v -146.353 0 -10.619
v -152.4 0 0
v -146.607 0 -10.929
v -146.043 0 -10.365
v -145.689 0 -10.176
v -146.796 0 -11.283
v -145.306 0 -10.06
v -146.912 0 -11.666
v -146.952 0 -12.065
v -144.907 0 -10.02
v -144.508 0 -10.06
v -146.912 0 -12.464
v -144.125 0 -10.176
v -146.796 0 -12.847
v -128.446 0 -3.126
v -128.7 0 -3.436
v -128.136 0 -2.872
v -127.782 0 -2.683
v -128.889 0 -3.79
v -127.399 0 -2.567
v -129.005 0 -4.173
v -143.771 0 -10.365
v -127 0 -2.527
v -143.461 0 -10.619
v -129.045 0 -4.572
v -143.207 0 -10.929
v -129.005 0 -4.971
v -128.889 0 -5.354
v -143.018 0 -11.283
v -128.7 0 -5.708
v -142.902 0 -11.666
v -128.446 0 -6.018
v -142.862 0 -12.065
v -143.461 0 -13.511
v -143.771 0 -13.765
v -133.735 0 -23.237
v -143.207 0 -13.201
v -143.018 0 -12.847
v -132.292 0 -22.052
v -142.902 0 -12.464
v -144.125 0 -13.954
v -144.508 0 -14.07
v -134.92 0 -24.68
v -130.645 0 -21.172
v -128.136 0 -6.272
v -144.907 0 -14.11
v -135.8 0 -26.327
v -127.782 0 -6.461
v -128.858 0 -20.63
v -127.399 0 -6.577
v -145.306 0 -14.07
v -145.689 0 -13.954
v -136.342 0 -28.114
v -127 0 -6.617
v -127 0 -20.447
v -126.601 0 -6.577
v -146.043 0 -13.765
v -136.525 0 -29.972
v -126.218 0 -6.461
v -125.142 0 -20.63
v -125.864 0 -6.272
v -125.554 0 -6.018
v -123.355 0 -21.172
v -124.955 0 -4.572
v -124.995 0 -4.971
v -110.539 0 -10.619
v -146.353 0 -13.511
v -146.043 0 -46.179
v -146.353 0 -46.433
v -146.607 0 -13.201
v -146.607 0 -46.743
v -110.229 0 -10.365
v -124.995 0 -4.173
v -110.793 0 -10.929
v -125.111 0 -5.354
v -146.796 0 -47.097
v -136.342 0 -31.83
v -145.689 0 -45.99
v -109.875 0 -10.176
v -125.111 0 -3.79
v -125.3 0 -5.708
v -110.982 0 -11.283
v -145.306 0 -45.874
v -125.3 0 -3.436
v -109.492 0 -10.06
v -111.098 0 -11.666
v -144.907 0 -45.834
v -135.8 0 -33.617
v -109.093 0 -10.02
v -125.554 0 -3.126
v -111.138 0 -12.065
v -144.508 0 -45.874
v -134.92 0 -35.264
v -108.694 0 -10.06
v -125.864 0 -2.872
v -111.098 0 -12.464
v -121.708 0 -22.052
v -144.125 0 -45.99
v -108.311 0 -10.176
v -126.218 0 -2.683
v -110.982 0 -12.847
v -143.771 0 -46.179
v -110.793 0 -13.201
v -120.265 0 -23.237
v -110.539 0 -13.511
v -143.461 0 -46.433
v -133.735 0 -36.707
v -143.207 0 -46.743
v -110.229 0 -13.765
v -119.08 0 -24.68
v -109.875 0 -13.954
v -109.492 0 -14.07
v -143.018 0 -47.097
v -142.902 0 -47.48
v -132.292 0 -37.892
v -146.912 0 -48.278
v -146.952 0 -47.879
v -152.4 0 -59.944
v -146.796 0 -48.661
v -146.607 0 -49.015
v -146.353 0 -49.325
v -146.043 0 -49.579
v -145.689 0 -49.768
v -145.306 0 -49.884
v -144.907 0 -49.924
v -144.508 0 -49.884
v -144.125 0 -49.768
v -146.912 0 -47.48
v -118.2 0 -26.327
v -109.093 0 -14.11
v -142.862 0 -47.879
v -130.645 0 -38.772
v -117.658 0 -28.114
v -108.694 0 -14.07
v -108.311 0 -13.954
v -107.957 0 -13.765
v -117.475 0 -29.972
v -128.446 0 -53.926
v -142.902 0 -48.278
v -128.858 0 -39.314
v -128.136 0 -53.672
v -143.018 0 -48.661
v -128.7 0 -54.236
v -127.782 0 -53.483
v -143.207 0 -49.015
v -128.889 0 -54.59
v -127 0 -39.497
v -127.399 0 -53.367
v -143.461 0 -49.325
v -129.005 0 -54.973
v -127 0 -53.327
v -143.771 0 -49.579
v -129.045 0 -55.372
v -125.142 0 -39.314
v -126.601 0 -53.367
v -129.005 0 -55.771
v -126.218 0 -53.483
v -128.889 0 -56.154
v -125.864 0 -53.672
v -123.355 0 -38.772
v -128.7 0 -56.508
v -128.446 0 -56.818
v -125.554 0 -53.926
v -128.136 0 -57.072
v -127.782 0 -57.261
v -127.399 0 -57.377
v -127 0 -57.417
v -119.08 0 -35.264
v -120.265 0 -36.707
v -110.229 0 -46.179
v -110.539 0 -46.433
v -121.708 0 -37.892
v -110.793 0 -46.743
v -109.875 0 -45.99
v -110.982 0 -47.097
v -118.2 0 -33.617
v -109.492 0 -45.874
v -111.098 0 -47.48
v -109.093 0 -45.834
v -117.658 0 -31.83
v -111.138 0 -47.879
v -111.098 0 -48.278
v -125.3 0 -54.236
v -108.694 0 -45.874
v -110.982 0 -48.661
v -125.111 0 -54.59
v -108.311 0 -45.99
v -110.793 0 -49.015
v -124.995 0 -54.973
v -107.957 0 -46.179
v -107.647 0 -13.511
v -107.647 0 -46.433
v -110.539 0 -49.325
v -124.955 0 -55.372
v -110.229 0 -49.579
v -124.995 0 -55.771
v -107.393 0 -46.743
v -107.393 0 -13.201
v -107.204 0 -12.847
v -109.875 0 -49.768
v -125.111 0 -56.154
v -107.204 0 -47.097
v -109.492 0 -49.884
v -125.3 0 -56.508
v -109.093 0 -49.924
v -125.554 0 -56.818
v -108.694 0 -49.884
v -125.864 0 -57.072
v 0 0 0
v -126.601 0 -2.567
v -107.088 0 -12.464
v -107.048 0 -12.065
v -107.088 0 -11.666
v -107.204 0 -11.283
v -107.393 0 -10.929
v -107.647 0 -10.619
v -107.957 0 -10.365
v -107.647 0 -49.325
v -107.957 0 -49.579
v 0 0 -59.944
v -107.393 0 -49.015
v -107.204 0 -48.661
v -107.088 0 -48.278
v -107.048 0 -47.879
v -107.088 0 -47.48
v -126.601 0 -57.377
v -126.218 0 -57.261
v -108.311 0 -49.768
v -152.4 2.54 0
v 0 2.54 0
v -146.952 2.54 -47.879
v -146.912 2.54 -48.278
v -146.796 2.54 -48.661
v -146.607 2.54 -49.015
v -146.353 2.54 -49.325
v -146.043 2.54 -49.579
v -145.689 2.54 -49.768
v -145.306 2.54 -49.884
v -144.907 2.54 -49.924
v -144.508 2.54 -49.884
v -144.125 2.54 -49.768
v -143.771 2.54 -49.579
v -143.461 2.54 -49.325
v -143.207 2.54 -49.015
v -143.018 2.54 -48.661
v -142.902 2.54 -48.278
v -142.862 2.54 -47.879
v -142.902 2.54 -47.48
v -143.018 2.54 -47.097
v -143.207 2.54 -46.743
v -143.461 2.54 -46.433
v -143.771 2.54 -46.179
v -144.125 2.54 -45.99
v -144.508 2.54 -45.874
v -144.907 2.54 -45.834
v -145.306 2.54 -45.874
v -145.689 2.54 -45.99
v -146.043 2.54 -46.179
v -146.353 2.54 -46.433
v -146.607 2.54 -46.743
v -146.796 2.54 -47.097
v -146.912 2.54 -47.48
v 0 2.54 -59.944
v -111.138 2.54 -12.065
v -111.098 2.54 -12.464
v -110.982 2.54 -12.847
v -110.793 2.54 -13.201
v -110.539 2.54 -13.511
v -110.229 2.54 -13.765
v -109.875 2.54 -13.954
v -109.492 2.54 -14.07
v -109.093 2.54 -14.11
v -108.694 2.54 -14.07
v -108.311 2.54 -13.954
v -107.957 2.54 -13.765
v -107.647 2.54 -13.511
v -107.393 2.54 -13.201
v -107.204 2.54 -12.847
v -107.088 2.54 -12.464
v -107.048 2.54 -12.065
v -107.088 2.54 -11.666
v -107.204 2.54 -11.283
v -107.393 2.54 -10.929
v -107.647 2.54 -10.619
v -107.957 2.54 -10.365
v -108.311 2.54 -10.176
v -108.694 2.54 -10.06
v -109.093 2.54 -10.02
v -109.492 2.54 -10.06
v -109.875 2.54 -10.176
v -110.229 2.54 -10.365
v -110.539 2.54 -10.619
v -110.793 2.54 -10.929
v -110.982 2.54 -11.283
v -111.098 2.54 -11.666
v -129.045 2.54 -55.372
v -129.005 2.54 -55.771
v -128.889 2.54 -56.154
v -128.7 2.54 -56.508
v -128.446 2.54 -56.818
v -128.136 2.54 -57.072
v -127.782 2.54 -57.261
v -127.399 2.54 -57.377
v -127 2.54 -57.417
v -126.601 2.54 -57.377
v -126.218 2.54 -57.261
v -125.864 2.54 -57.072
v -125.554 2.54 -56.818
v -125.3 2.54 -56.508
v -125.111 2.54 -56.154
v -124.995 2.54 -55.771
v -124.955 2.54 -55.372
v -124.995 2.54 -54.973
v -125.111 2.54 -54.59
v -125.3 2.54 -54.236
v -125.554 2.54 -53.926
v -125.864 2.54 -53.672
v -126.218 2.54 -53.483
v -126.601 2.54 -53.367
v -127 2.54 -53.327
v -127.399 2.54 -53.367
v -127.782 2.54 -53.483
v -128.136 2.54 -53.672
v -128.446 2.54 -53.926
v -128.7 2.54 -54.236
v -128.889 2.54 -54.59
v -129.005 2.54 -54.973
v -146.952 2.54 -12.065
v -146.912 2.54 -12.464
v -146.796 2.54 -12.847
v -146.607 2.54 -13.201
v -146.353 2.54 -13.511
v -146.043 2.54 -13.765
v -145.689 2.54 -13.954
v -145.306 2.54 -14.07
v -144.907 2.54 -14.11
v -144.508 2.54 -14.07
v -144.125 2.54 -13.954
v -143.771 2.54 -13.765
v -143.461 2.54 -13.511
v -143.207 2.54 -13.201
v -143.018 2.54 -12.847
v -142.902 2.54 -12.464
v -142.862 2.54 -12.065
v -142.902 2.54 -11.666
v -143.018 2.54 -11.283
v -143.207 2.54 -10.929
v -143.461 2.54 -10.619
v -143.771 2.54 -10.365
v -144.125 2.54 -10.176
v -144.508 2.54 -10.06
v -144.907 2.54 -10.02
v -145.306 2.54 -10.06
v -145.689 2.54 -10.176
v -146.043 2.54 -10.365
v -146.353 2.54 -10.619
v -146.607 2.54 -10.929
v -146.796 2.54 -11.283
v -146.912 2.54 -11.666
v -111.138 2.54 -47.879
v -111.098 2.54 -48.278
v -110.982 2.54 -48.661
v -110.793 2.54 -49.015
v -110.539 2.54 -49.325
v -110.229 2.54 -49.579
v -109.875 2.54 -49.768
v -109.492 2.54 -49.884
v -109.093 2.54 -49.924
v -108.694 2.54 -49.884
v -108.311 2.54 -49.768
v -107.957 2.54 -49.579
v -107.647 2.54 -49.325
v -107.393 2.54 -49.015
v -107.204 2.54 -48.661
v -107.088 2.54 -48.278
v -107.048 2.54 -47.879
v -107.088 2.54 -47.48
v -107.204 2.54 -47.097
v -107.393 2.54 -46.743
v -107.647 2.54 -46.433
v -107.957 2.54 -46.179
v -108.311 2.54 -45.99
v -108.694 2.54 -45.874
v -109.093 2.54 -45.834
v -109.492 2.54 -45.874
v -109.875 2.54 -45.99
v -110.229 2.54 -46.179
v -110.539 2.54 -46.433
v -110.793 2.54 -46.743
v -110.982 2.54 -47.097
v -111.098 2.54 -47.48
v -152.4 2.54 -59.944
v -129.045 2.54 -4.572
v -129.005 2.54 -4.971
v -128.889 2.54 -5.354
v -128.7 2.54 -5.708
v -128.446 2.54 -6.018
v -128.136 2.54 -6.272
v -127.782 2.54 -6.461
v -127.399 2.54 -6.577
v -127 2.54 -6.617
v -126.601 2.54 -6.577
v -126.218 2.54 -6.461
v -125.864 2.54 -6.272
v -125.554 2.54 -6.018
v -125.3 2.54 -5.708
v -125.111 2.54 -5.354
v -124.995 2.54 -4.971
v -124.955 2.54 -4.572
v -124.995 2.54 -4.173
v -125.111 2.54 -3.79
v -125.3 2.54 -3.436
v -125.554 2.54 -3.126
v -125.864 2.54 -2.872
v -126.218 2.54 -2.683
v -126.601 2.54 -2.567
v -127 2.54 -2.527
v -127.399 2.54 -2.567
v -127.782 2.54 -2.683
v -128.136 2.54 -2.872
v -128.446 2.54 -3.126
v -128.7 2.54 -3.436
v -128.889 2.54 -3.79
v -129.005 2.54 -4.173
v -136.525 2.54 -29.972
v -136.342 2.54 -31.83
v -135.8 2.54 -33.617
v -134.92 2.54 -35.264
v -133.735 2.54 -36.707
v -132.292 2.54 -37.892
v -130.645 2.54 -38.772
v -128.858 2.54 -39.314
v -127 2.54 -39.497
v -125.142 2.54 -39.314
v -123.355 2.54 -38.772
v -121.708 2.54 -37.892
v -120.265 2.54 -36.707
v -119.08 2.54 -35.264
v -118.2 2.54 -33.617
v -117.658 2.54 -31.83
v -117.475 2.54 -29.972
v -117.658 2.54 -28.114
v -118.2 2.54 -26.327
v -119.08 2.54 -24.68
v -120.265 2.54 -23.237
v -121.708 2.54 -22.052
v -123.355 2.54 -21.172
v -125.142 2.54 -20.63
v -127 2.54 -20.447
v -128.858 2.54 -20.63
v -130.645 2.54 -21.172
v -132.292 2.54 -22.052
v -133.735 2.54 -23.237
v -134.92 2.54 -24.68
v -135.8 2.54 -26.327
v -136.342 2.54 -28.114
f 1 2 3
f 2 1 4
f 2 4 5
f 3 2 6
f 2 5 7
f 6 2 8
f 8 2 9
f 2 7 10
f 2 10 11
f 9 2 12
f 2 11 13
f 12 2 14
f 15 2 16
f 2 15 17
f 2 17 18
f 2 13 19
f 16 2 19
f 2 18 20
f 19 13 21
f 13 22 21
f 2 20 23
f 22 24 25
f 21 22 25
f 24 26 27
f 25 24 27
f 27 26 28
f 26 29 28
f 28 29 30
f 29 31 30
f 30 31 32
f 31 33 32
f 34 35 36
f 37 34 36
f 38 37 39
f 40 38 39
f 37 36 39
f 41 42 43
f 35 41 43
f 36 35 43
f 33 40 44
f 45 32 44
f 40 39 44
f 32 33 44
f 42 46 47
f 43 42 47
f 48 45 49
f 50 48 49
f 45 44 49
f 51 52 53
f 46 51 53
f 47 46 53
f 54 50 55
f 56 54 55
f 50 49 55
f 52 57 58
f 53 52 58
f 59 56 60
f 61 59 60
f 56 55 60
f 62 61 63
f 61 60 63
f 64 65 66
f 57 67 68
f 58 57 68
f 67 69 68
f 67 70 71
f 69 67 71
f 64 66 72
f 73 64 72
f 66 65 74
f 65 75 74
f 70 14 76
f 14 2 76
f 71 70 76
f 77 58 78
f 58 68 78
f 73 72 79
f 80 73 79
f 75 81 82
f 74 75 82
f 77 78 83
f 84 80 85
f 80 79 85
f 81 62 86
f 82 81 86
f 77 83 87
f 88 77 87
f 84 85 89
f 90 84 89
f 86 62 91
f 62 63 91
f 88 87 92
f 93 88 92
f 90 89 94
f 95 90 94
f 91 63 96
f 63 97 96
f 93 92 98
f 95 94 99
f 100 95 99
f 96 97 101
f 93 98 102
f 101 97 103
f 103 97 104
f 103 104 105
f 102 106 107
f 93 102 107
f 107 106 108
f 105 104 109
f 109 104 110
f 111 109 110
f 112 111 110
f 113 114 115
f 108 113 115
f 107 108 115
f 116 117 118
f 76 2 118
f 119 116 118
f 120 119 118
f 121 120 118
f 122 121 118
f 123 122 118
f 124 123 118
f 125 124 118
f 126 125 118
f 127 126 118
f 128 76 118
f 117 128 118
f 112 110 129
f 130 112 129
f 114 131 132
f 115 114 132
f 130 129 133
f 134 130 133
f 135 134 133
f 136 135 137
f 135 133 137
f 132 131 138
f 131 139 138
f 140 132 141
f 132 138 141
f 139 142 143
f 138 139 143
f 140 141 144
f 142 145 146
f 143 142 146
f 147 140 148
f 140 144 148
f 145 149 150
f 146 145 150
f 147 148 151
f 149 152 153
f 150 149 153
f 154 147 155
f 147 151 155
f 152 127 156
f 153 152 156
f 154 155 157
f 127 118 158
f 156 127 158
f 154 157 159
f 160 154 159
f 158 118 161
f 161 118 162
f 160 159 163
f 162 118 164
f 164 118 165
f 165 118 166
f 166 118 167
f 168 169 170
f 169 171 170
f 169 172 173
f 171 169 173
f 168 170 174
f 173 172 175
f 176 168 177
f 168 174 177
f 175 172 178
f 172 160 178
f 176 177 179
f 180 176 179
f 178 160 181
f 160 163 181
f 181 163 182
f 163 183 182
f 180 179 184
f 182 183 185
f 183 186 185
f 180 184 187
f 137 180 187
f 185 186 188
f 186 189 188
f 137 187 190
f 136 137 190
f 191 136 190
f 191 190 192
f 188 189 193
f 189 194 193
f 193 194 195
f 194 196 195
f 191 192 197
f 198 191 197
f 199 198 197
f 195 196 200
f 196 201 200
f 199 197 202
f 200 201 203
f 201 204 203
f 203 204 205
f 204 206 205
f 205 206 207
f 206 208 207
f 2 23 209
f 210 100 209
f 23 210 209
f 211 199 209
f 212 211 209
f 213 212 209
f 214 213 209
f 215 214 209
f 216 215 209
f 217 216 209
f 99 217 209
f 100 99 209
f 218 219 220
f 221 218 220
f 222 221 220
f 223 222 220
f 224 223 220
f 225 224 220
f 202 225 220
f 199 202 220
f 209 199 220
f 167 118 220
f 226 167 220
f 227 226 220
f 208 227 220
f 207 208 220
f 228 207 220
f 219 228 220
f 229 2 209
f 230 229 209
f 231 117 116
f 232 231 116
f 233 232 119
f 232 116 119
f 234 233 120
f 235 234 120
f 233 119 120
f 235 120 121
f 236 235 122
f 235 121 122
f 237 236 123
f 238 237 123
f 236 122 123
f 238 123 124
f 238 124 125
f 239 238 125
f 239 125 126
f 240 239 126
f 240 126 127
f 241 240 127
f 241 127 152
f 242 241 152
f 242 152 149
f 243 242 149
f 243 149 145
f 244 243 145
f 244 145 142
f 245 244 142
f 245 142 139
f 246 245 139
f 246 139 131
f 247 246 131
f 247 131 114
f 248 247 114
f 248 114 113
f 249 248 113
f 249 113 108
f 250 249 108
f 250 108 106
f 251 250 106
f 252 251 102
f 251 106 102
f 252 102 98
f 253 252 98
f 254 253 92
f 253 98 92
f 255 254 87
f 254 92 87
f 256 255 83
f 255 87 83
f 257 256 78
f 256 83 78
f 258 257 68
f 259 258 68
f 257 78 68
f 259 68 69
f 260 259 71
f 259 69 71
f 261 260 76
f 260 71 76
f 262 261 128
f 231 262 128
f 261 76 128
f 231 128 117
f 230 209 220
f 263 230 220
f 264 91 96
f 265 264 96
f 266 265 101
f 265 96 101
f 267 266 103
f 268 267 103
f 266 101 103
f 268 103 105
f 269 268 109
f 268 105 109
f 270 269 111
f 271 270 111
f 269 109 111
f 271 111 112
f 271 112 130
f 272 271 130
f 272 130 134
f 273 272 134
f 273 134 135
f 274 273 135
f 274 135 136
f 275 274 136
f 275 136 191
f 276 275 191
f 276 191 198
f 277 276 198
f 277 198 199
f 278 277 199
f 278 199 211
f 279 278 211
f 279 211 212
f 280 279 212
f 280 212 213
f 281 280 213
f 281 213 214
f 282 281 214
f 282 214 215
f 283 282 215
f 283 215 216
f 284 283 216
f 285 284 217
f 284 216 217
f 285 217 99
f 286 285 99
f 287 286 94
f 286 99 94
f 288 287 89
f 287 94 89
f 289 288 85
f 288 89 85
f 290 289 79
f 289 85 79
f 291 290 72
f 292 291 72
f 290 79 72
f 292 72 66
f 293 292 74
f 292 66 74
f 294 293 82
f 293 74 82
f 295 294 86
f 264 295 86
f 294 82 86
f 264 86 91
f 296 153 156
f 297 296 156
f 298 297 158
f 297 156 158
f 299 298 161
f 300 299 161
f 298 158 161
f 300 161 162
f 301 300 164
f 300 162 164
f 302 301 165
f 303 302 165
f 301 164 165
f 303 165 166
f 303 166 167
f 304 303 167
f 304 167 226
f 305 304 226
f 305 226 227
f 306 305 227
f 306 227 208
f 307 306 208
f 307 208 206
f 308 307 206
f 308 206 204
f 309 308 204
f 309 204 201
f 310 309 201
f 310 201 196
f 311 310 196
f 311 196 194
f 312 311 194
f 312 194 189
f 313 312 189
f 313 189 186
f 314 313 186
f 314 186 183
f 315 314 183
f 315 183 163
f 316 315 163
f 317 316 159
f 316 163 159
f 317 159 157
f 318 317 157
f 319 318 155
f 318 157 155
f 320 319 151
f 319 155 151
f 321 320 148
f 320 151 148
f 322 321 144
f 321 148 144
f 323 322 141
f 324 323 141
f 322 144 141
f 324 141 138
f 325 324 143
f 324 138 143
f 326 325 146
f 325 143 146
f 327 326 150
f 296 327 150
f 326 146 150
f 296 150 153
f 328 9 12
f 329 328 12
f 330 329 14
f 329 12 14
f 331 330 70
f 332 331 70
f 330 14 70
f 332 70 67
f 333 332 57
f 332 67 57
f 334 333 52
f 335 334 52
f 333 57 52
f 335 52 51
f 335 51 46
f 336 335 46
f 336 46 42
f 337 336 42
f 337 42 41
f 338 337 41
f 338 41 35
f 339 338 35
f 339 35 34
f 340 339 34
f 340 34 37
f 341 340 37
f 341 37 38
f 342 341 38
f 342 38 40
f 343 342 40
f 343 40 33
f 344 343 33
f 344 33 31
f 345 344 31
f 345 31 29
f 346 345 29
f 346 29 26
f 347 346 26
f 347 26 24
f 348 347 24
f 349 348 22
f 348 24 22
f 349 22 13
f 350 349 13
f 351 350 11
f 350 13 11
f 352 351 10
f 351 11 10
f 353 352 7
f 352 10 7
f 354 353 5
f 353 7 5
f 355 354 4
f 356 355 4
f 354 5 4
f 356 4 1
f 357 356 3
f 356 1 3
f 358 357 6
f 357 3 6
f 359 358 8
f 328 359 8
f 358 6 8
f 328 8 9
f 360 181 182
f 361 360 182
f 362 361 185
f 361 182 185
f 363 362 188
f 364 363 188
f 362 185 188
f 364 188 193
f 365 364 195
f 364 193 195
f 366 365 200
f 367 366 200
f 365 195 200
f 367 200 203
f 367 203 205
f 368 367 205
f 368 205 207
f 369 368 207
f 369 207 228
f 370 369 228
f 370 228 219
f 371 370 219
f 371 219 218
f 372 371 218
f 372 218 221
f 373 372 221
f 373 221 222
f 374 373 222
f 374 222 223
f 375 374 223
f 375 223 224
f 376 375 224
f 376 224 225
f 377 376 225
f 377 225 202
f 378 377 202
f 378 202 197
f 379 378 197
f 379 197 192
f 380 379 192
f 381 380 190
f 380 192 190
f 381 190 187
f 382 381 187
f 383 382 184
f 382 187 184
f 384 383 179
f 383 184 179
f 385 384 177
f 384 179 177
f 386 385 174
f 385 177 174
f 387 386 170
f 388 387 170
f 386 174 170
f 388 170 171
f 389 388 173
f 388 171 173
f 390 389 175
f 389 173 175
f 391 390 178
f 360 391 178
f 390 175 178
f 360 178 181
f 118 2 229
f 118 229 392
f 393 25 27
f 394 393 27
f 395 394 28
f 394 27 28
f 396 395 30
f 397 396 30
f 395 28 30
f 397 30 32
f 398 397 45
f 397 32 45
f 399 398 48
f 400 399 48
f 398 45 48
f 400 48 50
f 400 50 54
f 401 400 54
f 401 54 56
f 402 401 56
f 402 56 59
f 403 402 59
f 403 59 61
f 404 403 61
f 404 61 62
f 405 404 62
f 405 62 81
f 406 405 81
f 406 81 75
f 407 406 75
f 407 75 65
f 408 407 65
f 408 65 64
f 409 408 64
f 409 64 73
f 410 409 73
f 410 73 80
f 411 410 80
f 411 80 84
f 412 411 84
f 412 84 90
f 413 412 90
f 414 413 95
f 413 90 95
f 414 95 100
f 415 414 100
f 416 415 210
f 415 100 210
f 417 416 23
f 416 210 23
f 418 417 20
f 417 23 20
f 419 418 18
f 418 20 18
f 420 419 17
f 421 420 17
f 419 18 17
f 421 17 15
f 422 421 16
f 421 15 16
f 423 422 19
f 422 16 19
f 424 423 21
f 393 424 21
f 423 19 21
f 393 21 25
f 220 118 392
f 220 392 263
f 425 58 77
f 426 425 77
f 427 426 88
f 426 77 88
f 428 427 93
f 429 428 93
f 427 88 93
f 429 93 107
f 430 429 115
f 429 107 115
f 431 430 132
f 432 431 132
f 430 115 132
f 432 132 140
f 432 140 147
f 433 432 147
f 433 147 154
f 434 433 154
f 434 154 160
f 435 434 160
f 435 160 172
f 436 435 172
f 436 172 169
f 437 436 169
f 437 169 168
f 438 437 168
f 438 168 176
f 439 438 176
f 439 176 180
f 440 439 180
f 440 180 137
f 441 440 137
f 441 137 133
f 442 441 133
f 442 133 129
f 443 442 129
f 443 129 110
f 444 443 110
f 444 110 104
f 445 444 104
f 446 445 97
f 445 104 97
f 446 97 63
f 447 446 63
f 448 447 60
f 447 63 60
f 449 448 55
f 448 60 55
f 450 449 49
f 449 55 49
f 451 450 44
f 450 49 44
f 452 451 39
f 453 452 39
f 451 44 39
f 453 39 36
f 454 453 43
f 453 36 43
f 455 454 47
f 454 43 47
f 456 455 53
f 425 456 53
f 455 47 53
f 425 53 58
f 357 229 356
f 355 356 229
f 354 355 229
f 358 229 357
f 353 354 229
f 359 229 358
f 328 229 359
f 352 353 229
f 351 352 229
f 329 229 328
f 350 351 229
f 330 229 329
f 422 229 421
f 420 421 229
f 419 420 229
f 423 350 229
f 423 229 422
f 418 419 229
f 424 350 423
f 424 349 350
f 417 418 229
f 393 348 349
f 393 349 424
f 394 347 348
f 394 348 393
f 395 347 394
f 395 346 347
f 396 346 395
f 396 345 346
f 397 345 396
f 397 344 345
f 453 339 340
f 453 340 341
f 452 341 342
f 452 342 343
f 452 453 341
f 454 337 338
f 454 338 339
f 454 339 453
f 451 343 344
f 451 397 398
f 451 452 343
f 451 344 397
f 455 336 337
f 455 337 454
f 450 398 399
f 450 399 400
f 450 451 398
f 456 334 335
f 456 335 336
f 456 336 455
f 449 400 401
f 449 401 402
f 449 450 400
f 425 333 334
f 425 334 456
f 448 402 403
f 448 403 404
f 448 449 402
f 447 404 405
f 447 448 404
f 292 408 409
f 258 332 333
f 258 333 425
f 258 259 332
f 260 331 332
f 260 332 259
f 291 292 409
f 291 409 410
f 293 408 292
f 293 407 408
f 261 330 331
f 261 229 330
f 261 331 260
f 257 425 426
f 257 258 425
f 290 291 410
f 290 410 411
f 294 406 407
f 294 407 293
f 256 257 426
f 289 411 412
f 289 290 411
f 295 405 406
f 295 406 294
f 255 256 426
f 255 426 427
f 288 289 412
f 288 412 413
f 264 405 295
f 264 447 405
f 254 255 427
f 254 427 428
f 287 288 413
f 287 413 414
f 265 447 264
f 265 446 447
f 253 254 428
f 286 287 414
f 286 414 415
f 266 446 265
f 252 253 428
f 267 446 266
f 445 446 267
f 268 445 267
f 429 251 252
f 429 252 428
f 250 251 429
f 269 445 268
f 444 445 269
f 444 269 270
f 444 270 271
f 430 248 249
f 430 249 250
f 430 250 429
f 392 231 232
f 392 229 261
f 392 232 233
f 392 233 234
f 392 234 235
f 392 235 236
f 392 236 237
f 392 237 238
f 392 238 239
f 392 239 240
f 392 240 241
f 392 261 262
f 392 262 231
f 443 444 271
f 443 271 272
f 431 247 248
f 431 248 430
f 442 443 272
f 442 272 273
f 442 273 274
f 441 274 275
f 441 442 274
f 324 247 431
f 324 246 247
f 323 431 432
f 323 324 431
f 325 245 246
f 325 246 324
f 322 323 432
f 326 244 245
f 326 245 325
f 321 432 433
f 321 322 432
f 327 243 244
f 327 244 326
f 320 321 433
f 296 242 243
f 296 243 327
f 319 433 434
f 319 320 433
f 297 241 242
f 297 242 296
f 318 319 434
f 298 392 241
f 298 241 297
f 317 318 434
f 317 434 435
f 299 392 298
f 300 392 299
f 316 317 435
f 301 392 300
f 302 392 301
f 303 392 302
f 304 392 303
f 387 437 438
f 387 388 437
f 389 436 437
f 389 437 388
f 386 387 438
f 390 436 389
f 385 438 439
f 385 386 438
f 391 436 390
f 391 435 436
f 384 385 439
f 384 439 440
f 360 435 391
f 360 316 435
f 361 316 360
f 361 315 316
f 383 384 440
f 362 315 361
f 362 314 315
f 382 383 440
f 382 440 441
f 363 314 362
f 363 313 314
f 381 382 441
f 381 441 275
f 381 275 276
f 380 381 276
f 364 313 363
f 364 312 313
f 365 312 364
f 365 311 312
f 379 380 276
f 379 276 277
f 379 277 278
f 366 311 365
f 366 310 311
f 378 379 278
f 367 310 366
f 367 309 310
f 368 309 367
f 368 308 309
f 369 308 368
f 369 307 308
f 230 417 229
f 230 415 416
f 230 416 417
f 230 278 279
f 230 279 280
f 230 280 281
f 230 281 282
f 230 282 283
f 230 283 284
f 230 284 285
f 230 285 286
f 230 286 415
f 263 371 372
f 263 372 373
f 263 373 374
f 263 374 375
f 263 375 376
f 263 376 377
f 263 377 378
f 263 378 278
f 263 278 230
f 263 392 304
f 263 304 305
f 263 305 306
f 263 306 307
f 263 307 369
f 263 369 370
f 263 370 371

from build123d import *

# Parameters (mm, degrees)
SKETCH1_W                   = 152.4
SKETCH1_H                   = 59.944
BOSS_EXTRUDE1_DEPTH         = 2.54
F_97_0_161_DIAMETER_HOLE1_D = 4.0894
F_97_0_75_DIAMETER_HOLE1_D  = 19.05


with BuildPart() as part:
    # Sketch1 → Boss-Extrude1 (new body)
    with BuildSketch(Plane(origin=(0, 0, 0), x_dir=(1, 0, 0), z_dir=(0, 1, 0))):
        with Locations((-76.2, 29.972)):
            Rectangle(SKETCH1_W, SKETCH1_H)
    extrude(amount=BOSS_EXTRUDE1_DEPTH)

    # #97 (0.161) Diameter Hole1 (through all)
    with Locations(Plane(origin=(0, 2.54, 0), x_dir=(1, 0, 0), z_dir=(0, 1, 0))):
        with Locations((-144.907, 47.879), (-127, 55.372), (-109.093, 47.879), (-109.093, 12.065), (-127, 4.572), (-144.907, 12.065)):
            Hole(F_97_0_161_DIAMETER_HOLE1_D / 2)

    # #97 (0.75) Diameter Hole1 (through all)
    with Locations(Plane(origin=(0, 2.54, 0), x_dir=(1, 0, 0), z_dir=(0, 1, 0))):
        with Locations((-127, 29.972)):
            Hole(F_97_0_75_DIAMETER_HOLE1_D / 2)


solid = part.part
